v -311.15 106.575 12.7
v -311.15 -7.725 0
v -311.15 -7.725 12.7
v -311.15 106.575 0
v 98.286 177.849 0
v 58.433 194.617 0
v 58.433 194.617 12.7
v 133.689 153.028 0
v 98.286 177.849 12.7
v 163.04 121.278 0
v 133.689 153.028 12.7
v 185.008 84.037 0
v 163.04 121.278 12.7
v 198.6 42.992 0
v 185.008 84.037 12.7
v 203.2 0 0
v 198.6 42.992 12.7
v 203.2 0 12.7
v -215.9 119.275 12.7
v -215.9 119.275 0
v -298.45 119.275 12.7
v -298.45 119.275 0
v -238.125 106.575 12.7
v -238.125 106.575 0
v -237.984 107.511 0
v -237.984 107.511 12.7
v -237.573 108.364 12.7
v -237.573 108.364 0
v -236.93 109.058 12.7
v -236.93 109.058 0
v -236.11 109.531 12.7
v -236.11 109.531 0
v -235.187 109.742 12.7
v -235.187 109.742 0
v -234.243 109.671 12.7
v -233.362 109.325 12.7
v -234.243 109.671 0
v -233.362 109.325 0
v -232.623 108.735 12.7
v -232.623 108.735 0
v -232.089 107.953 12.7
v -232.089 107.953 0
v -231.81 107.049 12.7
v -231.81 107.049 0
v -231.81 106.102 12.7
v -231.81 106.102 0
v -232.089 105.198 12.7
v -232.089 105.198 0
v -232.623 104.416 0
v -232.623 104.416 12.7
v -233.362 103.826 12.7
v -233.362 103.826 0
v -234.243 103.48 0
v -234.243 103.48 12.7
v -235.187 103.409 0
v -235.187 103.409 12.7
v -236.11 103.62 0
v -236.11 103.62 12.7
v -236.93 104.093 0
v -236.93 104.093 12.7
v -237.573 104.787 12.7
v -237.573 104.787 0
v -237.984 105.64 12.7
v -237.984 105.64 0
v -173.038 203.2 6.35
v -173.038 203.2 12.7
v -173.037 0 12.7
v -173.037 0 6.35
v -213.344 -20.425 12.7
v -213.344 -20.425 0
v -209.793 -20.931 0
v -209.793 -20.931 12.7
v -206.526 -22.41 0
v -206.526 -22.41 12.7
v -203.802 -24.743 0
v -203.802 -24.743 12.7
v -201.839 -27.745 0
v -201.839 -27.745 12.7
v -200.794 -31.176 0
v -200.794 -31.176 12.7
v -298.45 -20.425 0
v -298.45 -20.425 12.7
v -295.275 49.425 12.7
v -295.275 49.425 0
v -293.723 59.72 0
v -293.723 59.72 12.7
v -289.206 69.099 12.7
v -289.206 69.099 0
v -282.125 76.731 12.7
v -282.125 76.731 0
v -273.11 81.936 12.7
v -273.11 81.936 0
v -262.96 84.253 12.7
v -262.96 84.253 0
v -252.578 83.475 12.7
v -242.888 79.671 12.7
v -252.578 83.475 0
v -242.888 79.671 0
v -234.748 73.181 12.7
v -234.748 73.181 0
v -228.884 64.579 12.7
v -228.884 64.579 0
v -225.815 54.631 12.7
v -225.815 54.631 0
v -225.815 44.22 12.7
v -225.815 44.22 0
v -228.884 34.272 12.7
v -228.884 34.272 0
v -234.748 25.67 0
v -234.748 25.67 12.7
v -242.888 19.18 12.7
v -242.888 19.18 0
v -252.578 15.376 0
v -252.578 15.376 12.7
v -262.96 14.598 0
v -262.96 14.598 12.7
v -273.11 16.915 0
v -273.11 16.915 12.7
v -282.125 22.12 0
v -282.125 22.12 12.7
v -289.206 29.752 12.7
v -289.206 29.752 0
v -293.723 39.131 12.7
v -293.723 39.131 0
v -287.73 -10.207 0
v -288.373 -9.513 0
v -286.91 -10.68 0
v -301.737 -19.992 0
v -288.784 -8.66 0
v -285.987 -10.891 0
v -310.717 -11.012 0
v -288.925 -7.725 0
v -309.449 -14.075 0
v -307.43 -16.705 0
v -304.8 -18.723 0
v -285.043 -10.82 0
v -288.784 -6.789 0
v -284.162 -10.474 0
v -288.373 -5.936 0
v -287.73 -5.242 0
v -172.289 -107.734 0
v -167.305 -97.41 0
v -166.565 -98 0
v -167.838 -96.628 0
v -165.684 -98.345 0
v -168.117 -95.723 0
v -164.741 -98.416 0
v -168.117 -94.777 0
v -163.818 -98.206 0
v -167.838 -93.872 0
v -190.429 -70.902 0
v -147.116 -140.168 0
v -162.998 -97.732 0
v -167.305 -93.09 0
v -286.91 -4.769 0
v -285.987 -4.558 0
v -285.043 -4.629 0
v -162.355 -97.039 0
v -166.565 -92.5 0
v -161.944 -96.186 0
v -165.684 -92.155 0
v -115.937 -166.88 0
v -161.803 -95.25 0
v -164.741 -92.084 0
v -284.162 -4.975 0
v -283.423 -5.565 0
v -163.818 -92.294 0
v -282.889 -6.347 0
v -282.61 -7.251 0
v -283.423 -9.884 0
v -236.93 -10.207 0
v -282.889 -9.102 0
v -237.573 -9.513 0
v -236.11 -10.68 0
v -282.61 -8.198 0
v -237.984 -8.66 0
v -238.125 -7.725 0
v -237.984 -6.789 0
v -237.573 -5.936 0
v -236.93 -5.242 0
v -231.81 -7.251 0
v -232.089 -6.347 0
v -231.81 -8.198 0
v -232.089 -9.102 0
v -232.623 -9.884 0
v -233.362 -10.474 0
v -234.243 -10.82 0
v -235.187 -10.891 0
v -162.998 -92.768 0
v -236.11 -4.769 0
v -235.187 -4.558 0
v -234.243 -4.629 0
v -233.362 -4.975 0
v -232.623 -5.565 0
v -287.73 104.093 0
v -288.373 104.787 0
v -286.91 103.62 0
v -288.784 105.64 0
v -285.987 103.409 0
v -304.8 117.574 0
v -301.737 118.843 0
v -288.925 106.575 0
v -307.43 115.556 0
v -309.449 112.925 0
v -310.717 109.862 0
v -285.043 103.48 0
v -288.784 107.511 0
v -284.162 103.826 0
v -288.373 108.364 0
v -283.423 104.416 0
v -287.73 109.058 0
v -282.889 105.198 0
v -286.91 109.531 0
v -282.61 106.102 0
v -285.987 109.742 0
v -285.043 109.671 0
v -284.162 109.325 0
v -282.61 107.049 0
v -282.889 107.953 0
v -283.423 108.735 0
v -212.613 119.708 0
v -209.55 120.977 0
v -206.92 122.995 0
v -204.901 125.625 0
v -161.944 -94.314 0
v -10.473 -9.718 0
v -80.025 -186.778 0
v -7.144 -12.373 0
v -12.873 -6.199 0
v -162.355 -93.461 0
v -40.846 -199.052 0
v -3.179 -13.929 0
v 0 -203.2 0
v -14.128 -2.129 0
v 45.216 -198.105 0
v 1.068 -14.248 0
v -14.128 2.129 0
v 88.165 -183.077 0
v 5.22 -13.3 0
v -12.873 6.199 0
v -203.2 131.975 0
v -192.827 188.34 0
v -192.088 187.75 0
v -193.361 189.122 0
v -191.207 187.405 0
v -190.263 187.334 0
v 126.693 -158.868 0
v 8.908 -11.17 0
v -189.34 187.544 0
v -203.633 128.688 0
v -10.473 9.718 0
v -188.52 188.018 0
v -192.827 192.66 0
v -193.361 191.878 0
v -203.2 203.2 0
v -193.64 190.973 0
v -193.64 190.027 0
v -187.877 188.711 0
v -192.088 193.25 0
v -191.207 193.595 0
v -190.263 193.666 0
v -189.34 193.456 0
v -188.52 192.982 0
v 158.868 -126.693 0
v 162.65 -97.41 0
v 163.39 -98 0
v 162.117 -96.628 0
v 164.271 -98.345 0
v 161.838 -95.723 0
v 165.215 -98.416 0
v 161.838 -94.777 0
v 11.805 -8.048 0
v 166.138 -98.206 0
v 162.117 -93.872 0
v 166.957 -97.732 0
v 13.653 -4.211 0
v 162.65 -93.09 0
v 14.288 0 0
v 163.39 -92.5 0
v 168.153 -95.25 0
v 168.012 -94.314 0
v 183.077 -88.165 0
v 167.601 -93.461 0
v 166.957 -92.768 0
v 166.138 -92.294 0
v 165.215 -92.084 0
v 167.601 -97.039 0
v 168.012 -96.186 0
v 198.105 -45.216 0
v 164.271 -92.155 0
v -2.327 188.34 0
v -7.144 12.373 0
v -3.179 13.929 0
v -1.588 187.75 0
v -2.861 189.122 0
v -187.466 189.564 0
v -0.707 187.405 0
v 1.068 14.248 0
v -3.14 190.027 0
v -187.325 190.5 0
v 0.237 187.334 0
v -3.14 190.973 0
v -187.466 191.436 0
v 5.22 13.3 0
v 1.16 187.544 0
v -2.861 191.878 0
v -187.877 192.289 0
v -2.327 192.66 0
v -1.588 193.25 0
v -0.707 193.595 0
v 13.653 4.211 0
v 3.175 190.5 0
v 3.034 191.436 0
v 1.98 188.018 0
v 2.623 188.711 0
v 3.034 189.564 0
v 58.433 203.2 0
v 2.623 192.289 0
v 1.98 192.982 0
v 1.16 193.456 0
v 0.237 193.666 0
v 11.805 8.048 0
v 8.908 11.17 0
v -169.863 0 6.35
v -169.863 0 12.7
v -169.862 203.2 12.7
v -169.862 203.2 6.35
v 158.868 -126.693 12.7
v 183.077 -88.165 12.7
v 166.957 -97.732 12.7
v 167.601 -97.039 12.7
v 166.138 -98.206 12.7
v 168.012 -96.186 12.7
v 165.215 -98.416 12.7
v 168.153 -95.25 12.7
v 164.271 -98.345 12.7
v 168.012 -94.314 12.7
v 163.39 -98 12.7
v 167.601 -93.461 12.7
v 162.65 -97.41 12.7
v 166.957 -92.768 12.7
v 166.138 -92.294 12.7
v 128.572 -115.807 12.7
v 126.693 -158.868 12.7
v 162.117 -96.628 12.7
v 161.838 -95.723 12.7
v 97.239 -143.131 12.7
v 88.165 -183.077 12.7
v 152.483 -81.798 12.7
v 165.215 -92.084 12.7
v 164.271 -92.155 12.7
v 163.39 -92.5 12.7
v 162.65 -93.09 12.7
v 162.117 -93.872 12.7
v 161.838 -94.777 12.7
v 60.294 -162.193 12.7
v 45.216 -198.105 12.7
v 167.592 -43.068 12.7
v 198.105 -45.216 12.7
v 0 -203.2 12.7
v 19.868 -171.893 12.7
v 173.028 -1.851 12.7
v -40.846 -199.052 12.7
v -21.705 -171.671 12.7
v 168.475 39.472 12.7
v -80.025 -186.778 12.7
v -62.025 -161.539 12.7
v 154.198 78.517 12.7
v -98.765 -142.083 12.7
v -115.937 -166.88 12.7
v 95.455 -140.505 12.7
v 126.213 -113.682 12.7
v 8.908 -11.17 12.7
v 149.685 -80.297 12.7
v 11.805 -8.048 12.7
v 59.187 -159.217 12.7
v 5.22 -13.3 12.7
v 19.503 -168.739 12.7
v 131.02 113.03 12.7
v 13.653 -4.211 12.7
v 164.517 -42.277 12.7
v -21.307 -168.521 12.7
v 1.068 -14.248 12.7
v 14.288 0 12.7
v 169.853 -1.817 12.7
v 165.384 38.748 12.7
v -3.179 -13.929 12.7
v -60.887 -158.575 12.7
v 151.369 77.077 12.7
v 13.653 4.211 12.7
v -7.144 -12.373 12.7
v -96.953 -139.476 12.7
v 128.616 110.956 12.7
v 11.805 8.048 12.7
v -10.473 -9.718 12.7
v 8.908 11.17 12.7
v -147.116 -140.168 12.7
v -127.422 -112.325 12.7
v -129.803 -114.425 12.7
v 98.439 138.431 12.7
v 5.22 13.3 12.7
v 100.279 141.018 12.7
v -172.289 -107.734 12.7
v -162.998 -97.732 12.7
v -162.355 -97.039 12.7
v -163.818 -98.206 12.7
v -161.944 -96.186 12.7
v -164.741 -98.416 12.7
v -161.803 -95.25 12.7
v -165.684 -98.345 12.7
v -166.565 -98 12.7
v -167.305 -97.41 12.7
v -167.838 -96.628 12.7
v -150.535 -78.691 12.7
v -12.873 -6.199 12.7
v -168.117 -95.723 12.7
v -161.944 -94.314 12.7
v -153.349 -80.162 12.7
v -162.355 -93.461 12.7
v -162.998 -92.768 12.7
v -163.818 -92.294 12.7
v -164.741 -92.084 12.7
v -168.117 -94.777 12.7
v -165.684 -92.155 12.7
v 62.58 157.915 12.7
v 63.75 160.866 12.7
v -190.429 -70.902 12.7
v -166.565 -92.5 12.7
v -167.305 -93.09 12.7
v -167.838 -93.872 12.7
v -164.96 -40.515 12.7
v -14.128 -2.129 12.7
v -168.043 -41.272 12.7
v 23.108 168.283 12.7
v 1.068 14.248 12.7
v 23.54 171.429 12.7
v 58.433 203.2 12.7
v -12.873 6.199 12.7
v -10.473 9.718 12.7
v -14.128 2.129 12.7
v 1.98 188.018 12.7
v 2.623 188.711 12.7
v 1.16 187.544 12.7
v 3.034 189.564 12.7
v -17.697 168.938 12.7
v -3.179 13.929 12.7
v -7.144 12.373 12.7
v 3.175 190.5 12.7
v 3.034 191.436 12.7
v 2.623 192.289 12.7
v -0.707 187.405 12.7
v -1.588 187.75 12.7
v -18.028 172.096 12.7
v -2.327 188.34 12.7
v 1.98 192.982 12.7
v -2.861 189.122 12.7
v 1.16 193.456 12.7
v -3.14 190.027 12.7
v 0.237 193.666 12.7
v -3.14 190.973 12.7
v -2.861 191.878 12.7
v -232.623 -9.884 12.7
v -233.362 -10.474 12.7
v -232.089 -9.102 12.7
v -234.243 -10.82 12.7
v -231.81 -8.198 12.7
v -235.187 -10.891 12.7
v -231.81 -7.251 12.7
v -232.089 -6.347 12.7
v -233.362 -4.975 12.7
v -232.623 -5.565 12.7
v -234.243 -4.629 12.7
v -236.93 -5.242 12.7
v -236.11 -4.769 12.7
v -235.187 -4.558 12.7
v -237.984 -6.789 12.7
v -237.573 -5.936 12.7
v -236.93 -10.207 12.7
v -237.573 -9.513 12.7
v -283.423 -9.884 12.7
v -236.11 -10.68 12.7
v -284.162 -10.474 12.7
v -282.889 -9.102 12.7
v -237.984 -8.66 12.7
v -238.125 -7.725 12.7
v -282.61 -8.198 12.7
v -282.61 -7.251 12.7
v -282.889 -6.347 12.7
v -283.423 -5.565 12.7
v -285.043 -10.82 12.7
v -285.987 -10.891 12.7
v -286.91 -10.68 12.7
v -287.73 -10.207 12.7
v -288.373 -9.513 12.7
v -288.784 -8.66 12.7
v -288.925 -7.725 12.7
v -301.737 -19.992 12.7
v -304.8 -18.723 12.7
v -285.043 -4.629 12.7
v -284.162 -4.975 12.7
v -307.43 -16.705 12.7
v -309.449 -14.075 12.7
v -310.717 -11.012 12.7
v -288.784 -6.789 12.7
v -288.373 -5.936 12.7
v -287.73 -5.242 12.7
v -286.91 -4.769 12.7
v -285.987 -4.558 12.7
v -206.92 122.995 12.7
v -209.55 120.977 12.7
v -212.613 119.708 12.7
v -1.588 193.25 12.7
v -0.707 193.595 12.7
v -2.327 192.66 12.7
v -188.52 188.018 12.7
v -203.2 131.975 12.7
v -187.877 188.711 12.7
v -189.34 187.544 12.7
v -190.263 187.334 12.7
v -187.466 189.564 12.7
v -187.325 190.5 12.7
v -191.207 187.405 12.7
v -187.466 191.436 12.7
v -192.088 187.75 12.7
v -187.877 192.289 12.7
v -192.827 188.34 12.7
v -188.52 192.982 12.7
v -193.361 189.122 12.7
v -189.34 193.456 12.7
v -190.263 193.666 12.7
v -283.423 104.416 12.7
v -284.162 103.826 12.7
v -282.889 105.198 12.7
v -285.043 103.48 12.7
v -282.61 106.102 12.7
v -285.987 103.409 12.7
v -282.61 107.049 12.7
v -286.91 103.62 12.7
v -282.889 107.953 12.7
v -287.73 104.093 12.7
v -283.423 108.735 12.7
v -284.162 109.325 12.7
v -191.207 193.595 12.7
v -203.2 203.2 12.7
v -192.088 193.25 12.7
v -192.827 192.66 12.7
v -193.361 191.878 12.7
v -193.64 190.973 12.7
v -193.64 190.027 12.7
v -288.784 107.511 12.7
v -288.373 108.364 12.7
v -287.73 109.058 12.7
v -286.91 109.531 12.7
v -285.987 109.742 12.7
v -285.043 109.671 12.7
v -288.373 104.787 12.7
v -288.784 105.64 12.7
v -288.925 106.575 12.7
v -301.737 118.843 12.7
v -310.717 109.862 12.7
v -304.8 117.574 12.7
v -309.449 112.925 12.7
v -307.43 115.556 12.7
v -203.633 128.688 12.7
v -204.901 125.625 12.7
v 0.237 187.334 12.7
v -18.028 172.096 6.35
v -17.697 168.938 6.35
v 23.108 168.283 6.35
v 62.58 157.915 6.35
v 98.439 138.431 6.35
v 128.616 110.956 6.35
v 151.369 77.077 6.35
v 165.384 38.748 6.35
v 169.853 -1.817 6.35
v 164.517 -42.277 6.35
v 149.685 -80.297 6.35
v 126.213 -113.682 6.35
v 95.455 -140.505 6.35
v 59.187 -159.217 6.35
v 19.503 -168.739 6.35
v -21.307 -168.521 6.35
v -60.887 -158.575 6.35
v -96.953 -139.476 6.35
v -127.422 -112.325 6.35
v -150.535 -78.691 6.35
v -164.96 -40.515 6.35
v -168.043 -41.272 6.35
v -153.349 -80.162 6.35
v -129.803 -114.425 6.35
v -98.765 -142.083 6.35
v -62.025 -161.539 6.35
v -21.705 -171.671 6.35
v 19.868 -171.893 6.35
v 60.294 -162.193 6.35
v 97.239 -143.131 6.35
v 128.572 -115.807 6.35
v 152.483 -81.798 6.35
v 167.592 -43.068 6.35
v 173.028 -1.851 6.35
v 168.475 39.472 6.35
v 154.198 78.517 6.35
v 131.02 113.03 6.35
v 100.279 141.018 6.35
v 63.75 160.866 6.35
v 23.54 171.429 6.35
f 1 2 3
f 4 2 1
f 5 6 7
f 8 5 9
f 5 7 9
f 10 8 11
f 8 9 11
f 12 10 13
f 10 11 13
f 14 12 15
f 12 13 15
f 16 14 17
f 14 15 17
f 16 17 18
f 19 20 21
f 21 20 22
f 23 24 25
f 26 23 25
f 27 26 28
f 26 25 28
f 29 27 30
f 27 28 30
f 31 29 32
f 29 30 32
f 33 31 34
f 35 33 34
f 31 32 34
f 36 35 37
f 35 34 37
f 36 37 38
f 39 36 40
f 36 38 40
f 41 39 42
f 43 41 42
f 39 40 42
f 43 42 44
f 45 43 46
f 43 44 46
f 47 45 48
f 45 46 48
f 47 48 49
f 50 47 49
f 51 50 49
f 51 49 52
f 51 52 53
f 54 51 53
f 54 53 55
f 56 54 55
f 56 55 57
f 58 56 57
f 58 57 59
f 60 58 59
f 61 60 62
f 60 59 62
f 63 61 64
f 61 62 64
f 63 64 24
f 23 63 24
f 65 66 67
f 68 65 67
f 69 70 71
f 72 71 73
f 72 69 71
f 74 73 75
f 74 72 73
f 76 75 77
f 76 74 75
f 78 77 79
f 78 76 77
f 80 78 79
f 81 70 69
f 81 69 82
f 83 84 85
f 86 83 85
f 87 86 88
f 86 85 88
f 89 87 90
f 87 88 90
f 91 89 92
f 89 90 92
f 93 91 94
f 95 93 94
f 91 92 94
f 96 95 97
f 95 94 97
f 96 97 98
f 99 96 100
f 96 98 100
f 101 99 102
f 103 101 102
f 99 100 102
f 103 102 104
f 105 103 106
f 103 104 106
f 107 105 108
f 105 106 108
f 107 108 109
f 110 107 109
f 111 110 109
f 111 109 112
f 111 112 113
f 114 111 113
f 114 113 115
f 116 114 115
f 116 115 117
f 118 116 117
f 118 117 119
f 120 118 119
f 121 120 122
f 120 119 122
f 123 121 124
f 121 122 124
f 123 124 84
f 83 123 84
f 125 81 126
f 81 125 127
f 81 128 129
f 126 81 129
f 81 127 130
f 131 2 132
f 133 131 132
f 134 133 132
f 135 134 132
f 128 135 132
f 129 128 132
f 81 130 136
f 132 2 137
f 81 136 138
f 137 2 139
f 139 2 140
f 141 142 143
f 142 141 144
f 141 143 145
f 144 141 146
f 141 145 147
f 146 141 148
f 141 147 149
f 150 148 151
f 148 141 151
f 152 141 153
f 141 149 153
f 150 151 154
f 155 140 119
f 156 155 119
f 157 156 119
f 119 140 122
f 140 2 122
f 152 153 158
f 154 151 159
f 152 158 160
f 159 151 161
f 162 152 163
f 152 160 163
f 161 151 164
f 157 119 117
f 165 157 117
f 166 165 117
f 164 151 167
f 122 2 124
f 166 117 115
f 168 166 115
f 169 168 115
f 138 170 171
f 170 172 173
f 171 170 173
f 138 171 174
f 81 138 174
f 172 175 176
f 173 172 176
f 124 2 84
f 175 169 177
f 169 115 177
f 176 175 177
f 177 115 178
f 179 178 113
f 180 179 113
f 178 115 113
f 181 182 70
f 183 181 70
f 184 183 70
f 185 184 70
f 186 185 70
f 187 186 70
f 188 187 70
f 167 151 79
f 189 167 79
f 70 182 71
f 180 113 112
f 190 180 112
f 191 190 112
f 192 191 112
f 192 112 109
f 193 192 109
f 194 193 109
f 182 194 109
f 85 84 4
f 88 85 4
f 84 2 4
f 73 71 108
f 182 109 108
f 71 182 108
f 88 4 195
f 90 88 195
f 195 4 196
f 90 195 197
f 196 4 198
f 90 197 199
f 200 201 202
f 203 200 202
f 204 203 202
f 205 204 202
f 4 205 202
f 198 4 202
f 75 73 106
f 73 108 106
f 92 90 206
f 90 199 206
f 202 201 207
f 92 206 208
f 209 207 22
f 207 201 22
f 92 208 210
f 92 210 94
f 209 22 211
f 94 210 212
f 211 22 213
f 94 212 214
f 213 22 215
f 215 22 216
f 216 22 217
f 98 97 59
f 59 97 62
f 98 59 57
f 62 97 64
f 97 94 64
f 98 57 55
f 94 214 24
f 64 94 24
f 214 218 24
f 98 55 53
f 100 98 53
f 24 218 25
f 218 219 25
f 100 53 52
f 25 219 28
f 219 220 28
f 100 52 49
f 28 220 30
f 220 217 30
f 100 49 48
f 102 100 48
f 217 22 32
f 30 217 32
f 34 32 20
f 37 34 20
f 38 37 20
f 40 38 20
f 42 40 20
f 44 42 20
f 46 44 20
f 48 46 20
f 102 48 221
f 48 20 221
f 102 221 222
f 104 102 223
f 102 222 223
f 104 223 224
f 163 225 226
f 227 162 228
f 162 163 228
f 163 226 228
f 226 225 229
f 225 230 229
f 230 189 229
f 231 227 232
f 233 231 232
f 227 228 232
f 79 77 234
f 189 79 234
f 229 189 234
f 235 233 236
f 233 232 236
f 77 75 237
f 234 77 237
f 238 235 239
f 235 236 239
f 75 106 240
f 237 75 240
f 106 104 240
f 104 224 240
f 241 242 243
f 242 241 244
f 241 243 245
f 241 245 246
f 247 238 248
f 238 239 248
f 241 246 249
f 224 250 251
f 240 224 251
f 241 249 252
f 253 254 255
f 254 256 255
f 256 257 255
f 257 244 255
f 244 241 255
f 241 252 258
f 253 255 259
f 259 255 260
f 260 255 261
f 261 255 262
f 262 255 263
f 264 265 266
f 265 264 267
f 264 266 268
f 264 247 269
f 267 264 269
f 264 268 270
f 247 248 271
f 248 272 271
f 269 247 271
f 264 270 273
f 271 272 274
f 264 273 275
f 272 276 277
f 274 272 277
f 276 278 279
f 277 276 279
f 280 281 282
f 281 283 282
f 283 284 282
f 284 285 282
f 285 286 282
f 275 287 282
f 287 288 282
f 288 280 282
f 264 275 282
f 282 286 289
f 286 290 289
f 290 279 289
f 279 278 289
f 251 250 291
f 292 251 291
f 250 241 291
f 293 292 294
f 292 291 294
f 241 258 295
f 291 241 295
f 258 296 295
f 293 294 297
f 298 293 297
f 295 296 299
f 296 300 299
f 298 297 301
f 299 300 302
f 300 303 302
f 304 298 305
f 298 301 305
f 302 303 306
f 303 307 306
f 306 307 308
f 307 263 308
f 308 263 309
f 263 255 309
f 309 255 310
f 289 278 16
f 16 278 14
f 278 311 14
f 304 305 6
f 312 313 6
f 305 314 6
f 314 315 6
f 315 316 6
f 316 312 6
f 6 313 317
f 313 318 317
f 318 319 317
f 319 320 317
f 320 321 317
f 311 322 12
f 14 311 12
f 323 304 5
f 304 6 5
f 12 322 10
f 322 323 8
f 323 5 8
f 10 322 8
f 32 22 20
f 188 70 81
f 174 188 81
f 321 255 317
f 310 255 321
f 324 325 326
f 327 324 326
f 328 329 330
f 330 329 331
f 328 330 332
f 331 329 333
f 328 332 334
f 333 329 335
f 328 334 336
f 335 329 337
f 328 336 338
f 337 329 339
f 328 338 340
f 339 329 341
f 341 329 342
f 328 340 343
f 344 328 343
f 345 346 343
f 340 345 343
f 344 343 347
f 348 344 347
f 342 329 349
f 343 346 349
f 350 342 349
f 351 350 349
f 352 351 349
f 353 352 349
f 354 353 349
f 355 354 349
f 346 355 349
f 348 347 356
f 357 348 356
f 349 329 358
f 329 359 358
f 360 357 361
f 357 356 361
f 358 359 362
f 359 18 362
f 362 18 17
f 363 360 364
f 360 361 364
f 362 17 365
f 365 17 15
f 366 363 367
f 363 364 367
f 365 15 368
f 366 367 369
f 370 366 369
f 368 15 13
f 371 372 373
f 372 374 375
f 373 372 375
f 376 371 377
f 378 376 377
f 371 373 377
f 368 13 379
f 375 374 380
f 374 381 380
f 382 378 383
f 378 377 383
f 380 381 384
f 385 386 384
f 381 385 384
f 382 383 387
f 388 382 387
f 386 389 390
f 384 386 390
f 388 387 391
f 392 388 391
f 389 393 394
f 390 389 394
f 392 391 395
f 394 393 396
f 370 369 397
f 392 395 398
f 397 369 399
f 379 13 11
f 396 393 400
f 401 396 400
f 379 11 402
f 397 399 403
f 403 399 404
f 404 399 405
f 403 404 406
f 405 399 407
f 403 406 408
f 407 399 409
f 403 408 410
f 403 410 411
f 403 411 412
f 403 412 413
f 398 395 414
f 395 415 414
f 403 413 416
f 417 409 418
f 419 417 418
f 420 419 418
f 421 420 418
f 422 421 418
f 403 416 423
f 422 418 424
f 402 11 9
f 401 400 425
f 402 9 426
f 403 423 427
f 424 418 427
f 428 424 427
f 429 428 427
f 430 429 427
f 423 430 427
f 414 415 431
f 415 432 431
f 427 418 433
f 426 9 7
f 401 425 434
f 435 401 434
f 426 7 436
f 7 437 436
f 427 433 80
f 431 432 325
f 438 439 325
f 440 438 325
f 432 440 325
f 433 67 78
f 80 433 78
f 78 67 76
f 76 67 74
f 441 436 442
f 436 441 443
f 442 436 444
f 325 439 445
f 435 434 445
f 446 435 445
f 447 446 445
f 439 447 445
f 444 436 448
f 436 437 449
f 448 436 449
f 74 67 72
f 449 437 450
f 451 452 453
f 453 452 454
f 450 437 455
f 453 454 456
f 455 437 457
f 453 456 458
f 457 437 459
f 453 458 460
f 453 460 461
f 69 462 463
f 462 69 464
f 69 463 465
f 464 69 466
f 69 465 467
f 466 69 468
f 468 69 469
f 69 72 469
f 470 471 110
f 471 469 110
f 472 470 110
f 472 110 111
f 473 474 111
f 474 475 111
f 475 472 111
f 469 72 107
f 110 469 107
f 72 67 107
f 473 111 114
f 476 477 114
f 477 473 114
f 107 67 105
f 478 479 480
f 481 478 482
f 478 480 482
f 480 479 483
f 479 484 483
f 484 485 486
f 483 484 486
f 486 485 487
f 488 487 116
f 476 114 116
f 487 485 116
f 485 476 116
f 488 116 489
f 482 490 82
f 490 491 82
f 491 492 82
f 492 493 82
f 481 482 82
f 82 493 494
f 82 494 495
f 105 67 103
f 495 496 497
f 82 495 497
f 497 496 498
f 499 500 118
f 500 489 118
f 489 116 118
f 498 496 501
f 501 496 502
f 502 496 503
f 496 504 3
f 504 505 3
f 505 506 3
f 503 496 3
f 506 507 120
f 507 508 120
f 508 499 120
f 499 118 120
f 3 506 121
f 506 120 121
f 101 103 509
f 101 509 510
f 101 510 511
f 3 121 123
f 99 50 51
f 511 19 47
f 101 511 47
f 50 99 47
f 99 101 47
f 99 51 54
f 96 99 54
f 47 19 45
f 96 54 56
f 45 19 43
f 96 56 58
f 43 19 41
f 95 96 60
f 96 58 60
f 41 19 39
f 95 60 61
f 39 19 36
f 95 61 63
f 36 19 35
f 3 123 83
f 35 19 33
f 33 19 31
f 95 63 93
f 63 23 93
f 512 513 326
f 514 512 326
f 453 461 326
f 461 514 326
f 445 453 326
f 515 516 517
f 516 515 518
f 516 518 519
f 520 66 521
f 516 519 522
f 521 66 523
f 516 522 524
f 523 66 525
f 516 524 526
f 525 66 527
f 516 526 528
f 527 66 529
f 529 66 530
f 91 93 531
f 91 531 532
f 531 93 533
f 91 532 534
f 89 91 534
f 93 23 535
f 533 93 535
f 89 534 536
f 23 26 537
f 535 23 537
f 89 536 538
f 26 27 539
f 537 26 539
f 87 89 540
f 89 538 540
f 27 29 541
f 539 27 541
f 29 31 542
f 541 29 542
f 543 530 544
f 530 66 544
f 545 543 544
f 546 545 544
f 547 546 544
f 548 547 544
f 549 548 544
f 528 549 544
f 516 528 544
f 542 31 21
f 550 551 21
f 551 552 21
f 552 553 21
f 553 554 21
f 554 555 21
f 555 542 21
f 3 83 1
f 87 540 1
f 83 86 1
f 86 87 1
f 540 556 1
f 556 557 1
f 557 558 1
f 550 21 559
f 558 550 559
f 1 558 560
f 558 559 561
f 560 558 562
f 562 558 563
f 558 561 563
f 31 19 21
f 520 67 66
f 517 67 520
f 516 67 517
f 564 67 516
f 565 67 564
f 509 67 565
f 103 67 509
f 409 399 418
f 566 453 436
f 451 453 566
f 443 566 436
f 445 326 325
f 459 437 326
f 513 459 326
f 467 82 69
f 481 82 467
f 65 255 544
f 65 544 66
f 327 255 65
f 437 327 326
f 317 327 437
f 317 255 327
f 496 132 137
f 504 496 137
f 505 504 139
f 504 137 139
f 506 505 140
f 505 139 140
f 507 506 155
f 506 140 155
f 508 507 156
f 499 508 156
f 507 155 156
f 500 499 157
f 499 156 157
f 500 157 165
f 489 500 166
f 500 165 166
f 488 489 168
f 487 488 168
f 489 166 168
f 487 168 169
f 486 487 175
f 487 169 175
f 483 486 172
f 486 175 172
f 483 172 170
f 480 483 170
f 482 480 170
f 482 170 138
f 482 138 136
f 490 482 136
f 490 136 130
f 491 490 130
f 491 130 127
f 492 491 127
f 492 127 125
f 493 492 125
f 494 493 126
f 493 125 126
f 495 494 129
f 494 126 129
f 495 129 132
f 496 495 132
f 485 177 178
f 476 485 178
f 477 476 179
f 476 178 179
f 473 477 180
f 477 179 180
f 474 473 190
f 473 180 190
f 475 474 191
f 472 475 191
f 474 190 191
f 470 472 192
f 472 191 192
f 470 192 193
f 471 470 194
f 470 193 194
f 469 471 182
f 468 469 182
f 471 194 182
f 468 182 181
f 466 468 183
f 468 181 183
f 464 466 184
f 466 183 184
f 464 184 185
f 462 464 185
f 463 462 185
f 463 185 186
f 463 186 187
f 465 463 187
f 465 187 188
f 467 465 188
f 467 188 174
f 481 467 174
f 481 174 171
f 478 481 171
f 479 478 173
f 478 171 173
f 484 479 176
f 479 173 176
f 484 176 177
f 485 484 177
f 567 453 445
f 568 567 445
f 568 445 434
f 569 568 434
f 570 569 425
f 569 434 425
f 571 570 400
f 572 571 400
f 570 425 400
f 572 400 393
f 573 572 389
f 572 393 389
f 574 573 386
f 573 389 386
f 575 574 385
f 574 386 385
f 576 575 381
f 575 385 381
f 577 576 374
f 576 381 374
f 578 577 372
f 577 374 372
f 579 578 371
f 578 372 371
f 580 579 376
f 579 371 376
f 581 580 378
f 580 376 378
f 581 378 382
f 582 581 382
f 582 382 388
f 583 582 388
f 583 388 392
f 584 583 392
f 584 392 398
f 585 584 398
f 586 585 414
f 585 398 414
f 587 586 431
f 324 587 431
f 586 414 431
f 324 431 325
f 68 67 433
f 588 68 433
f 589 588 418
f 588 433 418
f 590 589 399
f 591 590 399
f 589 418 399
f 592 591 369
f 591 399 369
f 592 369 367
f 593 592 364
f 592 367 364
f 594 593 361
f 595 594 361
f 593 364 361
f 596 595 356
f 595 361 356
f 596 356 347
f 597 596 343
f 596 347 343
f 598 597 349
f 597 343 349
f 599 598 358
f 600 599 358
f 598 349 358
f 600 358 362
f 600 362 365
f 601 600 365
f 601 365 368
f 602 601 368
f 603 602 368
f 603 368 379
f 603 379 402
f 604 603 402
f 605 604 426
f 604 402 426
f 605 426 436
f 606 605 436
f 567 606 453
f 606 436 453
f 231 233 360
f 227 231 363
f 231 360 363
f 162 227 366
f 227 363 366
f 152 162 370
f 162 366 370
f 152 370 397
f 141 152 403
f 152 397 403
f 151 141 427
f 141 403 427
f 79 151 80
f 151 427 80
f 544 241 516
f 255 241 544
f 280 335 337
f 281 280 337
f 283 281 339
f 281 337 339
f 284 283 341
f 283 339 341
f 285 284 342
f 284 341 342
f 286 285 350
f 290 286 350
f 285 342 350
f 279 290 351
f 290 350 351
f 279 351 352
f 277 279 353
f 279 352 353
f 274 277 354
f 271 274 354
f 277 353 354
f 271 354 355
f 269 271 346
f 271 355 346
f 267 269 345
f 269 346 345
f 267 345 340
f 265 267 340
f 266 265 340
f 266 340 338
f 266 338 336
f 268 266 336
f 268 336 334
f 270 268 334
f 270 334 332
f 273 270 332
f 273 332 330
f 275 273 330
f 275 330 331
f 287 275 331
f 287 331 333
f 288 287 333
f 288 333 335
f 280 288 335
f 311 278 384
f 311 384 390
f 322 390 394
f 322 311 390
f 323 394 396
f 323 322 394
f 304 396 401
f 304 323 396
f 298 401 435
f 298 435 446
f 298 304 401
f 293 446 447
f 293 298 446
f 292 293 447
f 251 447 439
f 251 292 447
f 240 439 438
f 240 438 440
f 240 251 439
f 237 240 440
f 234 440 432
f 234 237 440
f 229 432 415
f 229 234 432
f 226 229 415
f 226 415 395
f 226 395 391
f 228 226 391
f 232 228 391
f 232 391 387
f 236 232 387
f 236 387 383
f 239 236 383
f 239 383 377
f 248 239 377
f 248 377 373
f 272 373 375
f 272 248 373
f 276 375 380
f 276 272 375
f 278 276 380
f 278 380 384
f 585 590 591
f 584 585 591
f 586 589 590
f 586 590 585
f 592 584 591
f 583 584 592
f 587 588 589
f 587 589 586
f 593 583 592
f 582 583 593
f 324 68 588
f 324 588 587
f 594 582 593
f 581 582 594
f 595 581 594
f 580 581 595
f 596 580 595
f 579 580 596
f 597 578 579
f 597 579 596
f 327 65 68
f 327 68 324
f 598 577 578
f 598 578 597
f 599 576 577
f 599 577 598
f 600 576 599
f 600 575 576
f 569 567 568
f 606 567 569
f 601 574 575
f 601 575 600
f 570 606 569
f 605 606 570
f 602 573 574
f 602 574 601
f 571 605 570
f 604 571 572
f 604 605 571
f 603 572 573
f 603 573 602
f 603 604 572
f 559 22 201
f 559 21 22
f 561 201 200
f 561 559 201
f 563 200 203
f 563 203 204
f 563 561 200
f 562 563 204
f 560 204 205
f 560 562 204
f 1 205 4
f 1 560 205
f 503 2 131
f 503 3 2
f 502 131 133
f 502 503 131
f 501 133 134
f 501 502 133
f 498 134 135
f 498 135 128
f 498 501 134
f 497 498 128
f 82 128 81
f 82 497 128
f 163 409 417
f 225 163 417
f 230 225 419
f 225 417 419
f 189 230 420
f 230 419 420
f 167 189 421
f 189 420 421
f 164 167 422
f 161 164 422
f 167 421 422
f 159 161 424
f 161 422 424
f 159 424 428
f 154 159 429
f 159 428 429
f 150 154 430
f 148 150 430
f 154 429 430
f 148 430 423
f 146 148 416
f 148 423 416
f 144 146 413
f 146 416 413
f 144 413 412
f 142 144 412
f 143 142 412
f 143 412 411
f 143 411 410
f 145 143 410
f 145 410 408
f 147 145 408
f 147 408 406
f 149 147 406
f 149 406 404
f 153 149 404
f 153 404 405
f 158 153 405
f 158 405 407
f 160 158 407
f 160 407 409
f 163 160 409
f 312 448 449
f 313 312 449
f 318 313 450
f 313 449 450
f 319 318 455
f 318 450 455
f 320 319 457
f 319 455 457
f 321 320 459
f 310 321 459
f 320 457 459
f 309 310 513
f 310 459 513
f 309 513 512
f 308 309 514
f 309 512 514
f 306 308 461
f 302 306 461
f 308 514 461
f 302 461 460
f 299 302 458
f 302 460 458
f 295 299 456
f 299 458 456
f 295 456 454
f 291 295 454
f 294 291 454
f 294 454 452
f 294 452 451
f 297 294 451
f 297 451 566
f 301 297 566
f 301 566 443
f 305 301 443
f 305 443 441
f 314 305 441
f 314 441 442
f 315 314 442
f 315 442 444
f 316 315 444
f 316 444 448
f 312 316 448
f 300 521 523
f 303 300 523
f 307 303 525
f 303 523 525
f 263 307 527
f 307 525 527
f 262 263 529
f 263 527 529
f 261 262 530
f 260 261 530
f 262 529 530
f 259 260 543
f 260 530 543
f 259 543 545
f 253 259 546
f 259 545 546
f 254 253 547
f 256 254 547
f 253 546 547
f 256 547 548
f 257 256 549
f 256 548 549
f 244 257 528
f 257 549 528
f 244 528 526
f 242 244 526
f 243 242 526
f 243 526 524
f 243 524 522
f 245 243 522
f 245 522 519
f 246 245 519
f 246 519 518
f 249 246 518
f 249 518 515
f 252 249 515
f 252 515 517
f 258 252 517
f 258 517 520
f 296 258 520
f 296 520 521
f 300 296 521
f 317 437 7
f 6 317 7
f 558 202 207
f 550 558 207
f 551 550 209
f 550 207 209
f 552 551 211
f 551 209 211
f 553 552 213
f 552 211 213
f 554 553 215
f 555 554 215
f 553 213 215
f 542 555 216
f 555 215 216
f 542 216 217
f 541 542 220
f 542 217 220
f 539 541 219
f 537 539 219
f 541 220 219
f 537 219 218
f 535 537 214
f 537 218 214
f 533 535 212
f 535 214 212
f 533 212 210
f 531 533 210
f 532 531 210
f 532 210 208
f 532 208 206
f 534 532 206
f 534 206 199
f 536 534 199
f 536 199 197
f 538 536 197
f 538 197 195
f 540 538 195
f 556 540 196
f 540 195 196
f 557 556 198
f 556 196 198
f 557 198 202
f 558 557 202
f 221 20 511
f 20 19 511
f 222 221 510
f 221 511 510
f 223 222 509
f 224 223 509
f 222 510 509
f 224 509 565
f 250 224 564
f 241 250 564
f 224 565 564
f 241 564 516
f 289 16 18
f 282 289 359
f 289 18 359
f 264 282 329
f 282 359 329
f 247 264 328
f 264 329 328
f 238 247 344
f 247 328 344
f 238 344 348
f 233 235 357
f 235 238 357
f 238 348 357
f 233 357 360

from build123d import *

# Parameters (mm, degrees)
SKETCH1_W               = 406.4
SKETCH1_H               = 406.4
SKETCH1_R               = 14.2875
BOSS_EXTRUDE1_DEPTH     = 12.7
CUT_EXTRUDE1_DEPTH      = 6.35
CUT_EXTRUDE2_DEPTH      = 13.7
SKETCH4_R               = 3.175
CUT_EXTRUDE3_DEPTH      = 1
CUT_EXTRUDE3_DEPTH_BACK = 13.7
SKETCH6_W               = 108.979085312
SKETCH6_H               = 139.7
SKETCH6_R               = 34.925
SKETCH6_R_2             = 3.175
BOSS_EXTRUDE2_DEPTH     = 12.7
FILLET1_R               = 12.7


with BuildPart() as part:
    # Sketch1 → Boss-Extrude1 (new body)
    with BuildSketch(Plane.XY):
        Rectangle(SKETCH1_W, SKETCH1_H)
        Circle(SKETCH1_R, mode=Mode.SUBTRACT)
    extrude(amount=BOSS_EXTRUDE1_DEPTH)

    # Sketch2 → Cut-Extrude1 (cut)
    with BuildSketch(Plane.XY.offset(12.7)):
        with BuildLine():
            Line((-18.027683557, 172.095842576), (-17.696900373, 168.938120694))
            ThreePointArc((-17.696900373, 168.938120694), (126.212734393, -113.68207679), (-169.8625, 0))
            Line((-169.8625, 0), (-169.8625, 203.2))
            Line((-169.8625, 203.2), (-173.0375, 203.2))
            Line((-173.0375, 203.2), (-173.0375, 0))
            ThreePointArc((-173.0375, 0), (128.571850923, -115.806975422), (-18.027683557, 172.095842576))
        make_face()
    extrude(amount=-CUT_EXTRUDE1_DEPTH, mode=Mode.SUBTRACT)

    # Sketch3 → Cut-Extrude2 (cut, through all)
    with BuildSketch(Plane.XY.offset(12.7)):
        with BuildLine():
            Line((58.432704894, 203.2), (58.432704894, 194.617211466))
            ThreePointArc((58.432704894, 194.617211466), (163.039513149, 121.278015948), (203.2, -3.13e-07))
            Line((203.2, -3.13e-07), (203.2, 203.2))
            Line((203.2, 203.2), (58.432704894, 203.2))
        make_face()
        with BuildLine():
            Line((203.2, -203.2), (203.2, -3.13e-07))
            ThreePointArc((203.2, -3.13e-07), (143.684097934, -143.68409794), (3.04e-07, -203.2))
            Line((3.04e-07, -203.2), (203.2, -203.2))
        make_face()
        with BuildLine():
            Line((-203.2, -203.2), (3.04e-07, -203.2))
            ThreePointArc((3.04e-07, -203.2), (-143.68409783, -143.684098045), (-203.2, 0))
            Line((-203.2, 0), (-203.2, -203.2))
        make_face()
    extrude(amount=-CUT_EXTRUDE2_DEPTH, mode=Mode.SUBTRACT)

    # Sketch4 → Cut-Extrude3 (cut, two sides)
    with BuildSketch(Plane.XY.offset(12.7)) as cut_extrude3_sk:
        with Locations((-190.5, 190.5)):
            Circle(SKETCH4_R)
        with Locations((-164.977839421, -95.25)):
            Circle(SKETCH4_R)
        with Locations((164.977839421, -95.25)):
            Circle(SKETCH4_R)
        with Locations((0, 190.5)):
            Circle(SKETCH4_R)
    extrude(amount=CUT_EXTRUDE3_DEPTH, mode=Mode.SUBTRACT)
    extrude(cut_extrude3_sk.sketch, amount=-CUT_EXTRUDE3_DEPTH_BACK, mode=Mode.SUBTRACT)

    # Sketch6 → Boss-Extrude2 (add, through all)
    with BuildSketch(Plane(origin=(0, 0, 0), x_dir=(-1, 0, 0), z_dir=(0, 0, -1))):
        with Locations((256.660457344, 49.425474201)):
            Rectangle(SKETCH6_W, SKETCH6_H)
        with Locations((260.35, 49.425474201)):
            Circle(SKETCH6_R, mode=Mode.SUBTRACT)
        with Locations((234.95, 106.575474201)):
            Circle(SKETCH6_R_2, mode=Mode.SUBTRACT)
        with Locations((285.75, 106.575474201)):
            Circle(SKETCH6_R_2, mode=Mode.SUBTRACT)
        with Locations((285.75, -7.724525799)):
            Circle(SKETCH6_R_2, mode=Mode.SUBTRACT)
        with Locations((234.95, -7.724525799)):
            Circle(SKETCH6_R_2, mode=Mode.SUBTRACT)
    extrude(amount=-BOSS_EXTRUDE2_DEPTH)

    # Fillet1
    fillet1_edges = [part.edges().sort_by_distance(p)[0] for p in [
        (-202.170914688, -20.424525799, 6.35),
        (-311.15, 119.275474201, 6.35),
        (-311.15, -20.424525799, 6.35),
        (-203.2, 119.275474201, 6.35),
    ]]
    fillet(fillet1_edges, radius=FILLET1_R)


solid = part.part
